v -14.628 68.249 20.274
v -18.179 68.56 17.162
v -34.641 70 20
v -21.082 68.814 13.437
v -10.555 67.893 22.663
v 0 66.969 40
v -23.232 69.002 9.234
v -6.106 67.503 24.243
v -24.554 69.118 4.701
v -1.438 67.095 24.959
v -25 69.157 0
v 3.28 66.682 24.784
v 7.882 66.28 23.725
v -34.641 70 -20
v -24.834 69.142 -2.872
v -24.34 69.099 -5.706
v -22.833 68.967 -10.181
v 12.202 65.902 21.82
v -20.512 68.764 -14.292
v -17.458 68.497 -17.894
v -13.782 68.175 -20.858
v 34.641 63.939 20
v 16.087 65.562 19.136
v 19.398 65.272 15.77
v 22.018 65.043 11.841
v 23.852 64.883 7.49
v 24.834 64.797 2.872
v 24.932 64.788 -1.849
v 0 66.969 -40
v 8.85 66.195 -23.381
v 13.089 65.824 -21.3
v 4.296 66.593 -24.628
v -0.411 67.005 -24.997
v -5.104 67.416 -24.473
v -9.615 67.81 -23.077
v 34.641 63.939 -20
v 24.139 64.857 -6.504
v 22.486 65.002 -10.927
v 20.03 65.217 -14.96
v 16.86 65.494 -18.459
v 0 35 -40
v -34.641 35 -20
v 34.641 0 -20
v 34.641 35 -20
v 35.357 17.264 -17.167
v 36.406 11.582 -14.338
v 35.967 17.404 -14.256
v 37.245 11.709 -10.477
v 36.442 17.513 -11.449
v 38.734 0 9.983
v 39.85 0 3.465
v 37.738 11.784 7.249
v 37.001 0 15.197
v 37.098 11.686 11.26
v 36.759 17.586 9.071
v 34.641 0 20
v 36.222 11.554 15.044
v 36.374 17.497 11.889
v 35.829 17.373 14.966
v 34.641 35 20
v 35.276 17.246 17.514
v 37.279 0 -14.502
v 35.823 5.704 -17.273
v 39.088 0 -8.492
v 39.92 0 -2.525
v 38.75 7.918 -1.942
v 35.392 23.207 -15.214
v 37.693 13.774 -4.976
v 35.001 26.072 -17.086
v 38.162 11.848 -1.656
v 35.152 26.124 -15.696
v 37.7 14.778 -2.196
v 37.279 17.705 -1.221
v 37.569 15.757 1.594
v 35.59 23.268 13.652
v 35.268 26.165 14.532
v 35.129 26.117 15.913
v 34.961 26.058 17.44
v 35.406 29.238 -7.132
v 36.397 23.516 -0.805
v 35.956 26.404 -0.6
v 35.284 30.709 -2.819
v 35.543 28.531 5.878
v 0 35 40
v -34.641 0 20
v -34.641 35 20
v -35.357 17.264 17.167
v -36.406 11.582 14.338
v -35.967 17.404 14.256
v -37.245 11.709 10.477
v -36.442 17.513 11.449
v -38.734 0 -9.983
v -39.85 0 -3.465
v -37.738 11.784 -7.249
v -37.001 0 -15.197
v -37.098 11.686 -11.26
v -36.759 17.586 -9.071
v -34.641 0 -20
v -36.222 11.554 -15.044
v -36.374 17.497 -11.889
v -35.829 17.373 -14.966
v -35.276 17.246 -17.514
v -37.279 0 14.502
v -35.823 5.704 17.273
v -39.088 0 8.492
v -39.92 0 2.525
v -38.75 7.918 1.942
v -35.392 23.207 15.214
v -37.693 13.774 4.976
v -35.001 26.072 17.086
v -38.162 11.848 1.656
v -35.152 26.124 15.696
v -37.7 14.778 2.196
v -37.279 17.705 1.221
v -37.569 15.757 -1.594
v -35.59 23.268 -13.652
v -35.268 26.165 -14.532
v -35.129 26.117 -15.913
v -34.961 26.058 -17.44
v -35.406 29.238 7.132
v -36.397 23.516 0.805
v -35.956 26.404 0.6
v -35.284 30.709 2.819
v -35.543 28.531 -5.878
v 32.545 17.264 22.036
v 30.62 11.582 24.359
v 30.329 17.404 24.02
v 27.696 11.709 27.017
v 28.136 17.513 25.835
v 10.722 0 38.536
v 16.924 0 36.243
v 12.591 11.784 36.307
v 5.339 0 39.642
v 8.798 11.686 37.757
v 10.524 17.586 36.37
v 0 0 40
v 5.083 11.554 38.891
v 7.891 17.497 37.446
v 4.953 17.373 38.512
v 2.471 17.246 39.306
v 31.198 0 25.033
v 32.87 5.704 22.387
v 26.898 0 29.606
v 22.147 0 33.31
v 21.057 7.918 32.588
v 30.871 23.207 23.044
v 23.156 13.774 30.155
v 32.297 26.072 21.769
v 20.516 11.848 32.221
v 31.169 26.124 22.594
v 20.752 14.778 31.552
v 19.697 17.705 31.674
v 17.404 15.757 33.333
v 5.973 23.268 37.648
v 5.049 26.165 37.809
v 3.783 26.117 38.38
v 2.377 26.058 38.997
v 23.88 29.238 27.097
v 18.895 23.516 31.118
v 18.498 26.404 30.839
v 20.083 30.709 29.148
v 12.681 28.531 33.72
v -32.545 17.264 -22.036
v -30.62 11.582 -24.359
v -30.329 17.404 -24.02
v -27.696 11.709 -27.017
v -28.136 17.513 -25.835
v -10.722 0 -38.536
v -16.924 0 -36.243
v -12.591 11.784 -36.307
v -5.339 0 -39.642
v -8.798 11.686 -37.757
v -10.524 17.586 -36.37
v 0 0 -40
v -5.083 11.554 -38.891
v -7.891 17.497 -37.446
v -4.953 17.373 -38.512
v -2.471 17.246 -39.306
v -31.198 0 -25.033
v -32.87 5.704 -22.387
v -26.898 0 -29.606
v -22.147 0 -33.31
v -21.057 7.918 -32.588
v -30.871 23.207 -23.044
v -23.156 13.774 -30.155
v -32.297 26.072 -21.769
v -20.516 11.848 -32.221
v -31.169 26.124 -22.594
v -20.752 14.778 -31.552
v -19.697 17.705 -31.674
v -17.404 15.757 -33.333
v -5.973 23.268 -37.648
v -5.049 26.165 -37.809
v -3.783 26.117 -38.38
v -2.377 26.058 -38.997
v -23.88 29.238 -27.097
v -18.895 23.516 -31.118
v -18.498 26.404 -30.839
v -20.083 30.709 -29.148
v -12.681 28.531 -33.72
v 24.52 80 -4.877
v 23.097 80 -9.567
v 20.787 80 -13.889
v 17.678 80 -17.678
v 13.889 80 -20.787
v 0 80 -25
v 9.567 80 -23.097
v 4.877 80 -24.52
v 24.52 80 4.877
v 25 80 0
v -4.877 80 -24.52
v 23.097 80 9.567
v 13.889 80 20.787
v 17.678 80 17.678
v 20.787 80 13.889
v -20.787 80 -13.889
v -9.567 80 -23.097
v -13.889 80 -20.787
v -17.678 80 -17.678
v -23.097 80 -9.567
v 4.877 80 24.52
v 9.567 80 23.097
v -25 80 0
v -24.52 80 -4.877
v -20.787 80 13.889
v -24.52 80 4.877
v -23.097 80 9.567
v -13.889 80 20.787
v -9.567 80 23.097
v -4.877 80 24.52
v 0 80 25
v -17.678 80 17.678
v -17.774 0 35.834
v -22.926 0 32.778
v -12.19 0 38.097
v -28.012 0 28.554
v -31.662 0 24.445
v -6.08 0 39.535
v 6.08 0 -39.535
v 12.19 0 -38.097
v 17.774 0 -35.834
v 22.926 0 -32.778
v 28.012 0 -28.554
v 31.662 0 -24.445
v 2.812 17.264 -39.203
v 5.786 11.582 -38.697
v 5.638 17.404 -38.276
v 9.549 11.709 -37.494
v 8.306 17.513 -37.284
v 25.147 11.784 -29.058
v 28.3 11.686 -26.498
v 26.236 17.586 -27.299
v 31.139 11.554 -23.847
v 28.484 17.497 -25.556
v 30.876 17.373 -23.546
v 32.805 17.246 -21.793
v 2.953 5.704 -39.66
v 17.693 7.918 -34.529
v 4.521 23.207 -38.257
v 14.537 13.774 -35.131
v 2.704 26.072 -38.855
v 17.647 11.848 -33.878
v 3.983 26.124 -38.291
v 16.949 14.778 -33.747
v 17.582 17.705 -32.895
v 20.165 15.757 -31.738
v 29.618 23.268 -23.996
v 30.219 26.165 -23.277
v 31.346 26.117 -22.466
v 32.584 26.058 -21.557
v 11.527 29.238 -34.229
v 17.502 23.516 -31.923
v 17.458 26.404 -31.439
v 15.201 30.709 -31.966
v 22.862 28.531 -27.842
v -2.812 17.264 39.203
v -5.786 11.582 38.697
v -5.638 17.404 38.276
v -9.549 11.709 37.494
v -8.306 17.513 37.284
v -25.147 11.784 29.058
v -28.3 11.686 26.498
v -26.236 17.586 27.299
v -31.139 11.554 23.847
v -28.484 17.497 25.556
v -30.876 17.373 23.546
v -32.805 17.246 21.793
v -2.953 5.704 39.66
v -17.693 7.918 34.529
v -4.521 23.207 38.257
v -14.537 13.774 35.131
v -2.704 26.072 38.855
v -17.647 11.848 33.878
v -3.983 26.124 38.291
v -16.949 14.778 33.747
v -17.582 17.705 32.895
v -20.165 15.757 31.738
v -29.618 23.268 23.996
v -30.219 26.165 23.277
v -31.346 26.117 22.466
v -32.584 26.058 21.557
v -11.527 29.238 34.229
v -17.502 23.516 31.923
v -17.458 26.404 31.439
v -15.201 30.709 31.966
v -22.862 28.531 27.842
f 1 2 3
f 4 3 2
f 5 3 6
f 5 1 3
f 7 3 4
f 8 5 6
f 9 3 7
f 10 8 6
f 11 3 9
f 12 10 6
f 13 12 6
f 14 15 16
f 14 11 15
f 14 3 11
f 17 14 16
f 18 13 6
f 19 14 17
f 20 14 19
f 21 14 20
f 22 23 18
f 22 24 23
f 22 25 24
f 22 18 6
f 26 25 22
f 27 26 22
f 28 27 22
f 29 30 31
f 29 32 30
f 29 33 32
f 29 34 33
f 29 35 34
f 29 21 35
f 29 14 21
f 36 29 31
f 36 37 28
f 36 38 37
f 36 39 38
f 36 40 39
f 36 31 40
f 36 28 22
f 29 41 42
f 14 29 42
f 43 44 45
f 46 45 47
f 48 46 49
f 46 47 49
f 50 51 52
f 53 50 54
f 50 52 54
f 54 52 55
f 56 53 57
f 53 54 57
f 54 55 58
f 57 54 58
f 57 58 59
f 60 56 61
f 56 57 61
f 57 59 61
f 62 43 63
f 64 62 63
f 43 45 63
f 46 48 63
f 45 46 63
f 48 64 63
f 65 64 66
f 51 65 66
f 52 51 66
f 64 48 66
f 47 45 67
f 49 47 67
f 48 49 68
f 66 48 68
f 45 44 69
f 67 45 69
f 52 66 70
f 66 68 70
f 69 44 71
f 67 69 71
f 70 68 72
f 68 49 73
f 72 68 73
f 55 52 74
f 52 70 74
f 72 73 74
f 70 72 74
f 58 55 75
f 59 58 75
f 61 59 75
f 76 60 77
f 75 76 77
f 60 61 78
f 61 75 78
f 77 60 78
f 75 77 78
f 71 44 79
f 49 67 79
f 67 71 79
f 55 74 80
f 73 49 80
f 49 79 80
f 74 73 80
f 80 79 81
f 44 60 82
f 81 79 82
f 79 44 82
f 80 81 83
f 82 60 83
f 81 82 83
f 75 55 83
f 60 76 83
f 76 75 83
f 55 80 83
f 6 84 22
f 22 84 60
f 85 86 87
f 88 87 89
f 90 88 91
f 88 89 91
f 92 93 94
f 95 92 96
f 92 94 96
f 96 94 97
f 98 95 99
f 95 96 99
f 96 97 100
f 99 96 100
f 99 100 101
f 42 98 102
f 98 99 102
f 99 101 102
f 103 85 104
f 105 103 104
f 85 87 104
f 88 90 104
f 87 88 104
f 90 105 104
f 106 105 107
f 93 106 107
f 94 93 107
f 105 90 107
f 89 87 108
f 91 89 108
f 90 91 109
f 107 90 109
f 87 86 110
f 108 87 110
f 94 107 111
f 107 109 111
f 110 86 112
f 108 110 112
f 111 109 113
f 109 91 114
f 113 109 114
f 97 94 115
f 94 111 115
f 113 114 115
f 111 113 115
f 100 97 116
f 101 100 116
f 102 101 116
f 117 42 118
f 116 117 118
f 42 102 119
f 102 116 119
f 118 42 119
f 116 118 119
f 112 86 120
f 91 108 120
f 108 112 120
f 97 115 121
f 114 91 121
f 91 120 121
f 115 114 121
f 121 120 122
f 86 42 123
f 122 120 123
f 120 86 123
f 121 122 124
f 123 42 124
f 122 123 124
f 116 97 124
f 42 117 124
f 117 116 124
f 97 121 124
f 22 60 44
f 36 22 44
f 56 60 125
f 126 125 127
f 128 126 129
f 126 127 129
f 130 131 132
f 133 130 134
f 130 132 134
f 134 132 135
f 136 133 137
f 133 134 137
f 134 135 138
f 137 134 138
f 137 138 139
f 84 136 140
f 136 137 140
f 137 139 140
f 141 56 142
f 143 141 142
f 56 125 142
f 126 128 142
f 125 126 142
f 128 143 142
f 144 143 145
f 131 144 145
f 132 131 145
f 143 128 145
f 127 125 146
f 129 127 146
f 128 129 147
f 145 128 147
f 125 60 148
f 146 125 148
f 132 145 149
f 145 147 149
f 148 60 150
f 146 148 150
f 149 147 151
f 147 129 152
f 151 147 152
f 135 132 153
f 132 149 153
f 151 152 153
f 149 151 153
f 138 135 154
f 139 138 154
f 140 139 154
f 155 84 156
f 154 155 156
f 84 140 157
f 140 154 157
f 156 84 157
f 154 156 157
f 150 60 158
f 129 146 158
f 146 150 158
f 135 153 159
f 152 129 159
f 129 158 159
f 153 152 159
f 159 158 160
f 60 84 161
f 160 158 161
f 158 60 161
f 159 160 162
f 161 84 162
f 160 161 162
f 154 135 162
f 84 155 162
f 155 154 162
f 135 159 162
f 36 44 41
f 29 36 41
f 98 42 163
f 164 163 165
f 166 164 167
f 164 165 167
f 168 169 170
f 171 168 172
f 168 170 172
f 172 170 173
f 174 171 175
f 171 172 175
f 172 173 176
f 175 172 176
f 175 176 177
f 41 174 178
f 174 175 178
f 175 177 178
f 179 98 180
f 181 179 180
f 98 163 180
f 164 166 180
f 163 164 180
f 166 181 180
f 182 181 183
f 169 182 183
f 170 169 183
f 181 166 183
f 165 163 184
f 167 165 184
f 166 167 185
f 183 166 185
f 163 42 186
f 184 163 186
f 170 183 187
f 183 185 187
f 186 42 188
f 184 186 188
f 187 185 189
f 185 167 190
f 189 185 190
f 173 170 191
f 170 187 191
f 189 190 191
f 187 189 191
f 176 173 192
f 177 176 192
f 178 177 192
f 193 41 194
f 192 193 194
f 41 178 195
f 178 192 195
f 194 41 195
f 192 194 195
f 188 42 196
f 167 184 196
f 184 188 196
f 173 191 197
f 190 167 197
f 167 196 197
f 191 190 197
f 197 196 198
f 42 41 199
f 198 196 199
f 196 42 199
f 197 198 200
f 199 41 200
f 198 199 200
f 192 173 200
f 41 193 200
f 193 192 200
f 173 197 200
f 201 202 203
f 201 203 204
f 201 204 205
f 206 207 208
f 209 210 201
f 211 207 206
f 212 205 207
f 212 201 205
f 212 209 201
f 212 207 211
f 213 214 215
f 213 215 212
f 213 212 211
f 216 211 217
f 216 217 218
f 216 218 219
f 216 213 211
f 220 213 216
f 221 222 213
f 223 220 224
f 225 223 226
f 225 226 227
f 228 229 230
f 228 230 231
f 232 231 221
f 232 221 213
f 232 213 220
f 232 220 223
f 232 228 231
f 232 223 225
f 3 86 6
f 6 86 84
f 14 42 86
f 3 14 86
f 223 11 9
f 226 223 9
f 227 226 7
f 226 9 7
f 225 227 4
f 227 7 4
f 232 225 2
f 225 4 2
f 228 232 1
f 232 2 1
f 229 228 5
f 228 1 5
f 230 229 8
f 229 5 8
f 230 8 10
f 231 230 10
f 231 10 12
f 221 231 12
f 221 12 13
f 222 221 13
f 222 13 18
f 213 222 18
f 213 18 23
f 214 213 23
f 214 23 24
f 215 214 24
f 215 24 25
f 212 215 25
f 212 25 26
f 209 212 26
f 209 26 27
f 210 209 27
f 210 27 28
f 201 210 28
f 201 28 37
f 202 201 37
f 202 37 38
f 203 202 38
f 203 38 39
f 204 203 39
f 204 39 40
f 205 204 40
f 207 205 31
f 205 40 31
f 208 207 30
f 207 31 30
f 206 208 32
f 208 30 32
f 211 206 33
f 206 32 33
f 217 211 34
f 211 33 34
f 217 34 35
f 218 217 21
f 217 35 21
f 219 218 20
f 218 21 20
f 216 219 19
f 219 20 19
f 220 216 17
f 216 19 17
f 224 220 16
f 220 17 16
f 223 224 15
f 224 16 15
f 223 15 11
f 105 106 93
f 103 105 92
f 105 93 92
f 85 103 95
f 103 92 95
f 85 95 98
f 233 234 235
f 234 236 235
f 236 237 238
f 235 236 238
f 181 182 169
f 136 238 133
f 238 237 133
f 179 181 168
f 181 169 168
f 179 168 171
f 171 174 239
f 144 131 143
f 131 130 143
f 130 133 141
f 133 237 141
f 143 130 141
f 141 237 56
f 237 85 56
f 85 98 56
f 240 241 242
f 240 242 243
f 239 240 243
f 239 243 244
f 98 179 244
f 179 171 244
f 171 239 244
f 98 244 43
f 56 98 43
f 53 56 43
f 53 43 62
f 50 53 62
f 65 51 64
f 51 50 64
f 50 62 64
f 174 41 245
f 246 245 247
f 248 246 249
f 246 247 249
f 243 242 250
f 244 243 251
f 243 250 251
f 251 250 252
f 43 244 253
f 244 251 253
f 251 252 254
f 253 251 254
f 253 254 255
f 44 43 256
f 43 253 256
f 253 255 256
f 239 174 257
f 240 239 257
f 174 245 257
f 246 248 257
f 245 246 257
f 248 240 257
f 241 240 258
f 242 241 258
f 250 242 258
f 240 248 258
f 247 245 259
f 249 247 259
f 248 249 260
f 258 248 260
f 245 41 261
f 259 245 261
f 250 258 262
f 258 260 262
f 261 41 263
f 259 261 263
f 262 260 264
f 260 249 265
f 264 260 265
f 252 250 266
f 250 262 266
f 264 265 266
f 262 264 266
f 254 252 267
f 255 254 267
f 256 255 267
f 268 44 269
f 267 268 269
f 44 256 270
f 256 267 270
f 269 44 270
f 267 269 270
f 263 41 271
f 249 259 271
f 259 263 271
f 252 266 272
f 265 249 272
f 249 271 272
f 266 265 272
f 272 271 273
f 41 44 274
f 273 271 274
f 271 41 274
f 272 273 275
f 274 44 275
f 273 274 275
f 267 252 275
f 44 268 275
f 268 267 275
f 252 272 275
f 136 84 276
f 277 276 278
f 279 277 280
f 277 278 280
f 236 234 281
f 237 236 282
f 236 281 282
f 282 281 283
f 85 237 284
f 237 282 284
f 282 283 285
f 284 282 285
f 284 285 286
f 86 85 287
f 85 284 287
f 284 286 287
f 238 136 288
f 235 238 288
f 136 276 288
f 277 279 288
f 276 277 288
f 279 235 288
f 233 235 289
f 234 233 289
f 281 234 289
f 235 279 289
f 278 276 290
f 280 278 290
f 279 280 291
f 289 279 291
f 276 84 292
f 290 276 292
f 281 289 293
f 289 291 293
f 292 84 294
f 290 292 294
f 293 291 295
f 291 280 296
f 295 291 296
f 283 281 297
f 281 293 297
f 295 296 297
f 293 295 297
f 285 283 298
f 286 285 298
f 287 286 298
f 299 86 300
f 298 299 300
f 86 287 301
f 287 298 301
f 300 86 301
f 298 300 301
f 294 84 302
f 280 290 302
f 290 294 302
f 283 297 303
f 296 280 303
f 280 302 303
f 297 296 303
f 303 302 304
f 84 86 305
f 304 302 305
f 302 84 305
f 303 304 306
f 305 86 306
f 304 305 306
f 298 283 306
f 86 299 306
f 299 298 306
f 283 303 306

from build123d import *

# Parameters (mm, degrees)
BOSS_EXTRUDE1_DEPTH      = 35
DRAFT3_START             = 66.714465374
DRAFT3_OUTLINE_W         = 72
DRAFT3_OUTLINE_H         = 84
DRAFT3_DEPTH             = 6.038326985
BOSS_EXTRUDE3_DEPTH      = 10
BOSS_EXTRUDE3_DEPTH_BACK = 10
SKETCH8_R                = 25


# Read off the part's stored shape, not the designer's step: Draft3
with BuildPart() as part:
    # Sketch3 for Loft2 → Loft2 section 0
    with BuildSketch(Plane(origin=(0, 0, 0), x_dir=(1, 0, 0), z_dir=(0, 1, 0))):
        with BuildLine():
            # circular arc as an exact rational Bezier (weights 1, cos(half-angle), 1)
            Bezier((-34.641016151, 20), (-23.094010767, 39.999999999), (0, 40), weights=[1, 0.866025404, 1])
            Bezier((0, 40), (23.094010767, 39.999999999), (34.641016151, 20), weights=[1, 0.866025404, 1])
            Bezier((34.641016151, 20), (46.188021536, 0), (34.641016151, -20), weights=[1, 0.866025404, 1])
            Bezier((34.641016151, -20), (23.094010767, -39.999999999), (0, -40), weights=[1, 0.866025404, 1])
            Bezier((0, -40), (-23.094010767, -39.999999999), (-34.641016151, -20), weights=[1, 0.866025404, 1])
            Bezier((-34.641016151, -20), (-46.188021536, 0), (-34.641016151, 20), weights=[1, 0.866025404, 1])
        make_face()
    # Sketch4 → Loft2 section 1
    with BuildSketch(Plane(origin=(0, 35, 0), x_dir=(-1, 0, 0), z_dir=(0, -1, 0))):
        with BuildLine():
            Line((34.641016151, 20), (0, 40))
            Line((0, 40), (-34.641016151, 20))
            Line((-34.641016151, 20), (-34.641016151, -20))
            Line((-34.641016151, -20), (0, -40))
            Line((0, -40), (34.641016151, -20))
            Line((34.641016151, -20), (34.641016151, 20))
        make_face()
    loft()

    # Sketch7 → Boss-Extrude1 (add)
    with BuildSketch(Plane(origin=(0, 35, 0), x_dir=(1, 0, 0), z_dir=(0, 1, 0))):
        Polygon((-34.641016151, 20), (-34.641016151, -20), (0, -40), (34.641016151, -20), (34.641016151, 20), (0, 40), align=None)
    extrude(amount=BOSS_EXTRUDE1_DEPTH)

    # Draft3 outline → Draft3 (cut)
    with BuildSketch(Plane(origin=(0, 0, 0), x_dir=(0.9961946980917452, -0.08715574274766182, 0), z_dir=(0.08715574274766182, 0.9961946980917452, 0)).offset(DRAFT3_START)):
        with Locations((-6, 0)):
            Rectangle(DRAFT3_OUTLINE_W, DRAFT3_OUTLINE_H)
    extrude(amount=DRAFT3_DEPTH, mode=Mode.SUBTRACT)

    # Sketch8 → Boss-Extrude3 (add, two sides: drawn at the far end of the back side and taken through both)
    with BuildSketch(Plane(origin=(0, 70, 0), x_dir=(1, 0, 0), z_dir=(0, 1, 0)).offset(-BOSS_EXTRUDE3_DEPTH_BACK)):
        with Locations(Location((0, 0, 0), (0, 0, 180))):
            Circle(SKETCH8_R)
    extrude(amount=BOSS_EXTRUDE3_DEPTH + BOSS_EXTRUDE3_DEPTH_BACK)


solid = part.part
